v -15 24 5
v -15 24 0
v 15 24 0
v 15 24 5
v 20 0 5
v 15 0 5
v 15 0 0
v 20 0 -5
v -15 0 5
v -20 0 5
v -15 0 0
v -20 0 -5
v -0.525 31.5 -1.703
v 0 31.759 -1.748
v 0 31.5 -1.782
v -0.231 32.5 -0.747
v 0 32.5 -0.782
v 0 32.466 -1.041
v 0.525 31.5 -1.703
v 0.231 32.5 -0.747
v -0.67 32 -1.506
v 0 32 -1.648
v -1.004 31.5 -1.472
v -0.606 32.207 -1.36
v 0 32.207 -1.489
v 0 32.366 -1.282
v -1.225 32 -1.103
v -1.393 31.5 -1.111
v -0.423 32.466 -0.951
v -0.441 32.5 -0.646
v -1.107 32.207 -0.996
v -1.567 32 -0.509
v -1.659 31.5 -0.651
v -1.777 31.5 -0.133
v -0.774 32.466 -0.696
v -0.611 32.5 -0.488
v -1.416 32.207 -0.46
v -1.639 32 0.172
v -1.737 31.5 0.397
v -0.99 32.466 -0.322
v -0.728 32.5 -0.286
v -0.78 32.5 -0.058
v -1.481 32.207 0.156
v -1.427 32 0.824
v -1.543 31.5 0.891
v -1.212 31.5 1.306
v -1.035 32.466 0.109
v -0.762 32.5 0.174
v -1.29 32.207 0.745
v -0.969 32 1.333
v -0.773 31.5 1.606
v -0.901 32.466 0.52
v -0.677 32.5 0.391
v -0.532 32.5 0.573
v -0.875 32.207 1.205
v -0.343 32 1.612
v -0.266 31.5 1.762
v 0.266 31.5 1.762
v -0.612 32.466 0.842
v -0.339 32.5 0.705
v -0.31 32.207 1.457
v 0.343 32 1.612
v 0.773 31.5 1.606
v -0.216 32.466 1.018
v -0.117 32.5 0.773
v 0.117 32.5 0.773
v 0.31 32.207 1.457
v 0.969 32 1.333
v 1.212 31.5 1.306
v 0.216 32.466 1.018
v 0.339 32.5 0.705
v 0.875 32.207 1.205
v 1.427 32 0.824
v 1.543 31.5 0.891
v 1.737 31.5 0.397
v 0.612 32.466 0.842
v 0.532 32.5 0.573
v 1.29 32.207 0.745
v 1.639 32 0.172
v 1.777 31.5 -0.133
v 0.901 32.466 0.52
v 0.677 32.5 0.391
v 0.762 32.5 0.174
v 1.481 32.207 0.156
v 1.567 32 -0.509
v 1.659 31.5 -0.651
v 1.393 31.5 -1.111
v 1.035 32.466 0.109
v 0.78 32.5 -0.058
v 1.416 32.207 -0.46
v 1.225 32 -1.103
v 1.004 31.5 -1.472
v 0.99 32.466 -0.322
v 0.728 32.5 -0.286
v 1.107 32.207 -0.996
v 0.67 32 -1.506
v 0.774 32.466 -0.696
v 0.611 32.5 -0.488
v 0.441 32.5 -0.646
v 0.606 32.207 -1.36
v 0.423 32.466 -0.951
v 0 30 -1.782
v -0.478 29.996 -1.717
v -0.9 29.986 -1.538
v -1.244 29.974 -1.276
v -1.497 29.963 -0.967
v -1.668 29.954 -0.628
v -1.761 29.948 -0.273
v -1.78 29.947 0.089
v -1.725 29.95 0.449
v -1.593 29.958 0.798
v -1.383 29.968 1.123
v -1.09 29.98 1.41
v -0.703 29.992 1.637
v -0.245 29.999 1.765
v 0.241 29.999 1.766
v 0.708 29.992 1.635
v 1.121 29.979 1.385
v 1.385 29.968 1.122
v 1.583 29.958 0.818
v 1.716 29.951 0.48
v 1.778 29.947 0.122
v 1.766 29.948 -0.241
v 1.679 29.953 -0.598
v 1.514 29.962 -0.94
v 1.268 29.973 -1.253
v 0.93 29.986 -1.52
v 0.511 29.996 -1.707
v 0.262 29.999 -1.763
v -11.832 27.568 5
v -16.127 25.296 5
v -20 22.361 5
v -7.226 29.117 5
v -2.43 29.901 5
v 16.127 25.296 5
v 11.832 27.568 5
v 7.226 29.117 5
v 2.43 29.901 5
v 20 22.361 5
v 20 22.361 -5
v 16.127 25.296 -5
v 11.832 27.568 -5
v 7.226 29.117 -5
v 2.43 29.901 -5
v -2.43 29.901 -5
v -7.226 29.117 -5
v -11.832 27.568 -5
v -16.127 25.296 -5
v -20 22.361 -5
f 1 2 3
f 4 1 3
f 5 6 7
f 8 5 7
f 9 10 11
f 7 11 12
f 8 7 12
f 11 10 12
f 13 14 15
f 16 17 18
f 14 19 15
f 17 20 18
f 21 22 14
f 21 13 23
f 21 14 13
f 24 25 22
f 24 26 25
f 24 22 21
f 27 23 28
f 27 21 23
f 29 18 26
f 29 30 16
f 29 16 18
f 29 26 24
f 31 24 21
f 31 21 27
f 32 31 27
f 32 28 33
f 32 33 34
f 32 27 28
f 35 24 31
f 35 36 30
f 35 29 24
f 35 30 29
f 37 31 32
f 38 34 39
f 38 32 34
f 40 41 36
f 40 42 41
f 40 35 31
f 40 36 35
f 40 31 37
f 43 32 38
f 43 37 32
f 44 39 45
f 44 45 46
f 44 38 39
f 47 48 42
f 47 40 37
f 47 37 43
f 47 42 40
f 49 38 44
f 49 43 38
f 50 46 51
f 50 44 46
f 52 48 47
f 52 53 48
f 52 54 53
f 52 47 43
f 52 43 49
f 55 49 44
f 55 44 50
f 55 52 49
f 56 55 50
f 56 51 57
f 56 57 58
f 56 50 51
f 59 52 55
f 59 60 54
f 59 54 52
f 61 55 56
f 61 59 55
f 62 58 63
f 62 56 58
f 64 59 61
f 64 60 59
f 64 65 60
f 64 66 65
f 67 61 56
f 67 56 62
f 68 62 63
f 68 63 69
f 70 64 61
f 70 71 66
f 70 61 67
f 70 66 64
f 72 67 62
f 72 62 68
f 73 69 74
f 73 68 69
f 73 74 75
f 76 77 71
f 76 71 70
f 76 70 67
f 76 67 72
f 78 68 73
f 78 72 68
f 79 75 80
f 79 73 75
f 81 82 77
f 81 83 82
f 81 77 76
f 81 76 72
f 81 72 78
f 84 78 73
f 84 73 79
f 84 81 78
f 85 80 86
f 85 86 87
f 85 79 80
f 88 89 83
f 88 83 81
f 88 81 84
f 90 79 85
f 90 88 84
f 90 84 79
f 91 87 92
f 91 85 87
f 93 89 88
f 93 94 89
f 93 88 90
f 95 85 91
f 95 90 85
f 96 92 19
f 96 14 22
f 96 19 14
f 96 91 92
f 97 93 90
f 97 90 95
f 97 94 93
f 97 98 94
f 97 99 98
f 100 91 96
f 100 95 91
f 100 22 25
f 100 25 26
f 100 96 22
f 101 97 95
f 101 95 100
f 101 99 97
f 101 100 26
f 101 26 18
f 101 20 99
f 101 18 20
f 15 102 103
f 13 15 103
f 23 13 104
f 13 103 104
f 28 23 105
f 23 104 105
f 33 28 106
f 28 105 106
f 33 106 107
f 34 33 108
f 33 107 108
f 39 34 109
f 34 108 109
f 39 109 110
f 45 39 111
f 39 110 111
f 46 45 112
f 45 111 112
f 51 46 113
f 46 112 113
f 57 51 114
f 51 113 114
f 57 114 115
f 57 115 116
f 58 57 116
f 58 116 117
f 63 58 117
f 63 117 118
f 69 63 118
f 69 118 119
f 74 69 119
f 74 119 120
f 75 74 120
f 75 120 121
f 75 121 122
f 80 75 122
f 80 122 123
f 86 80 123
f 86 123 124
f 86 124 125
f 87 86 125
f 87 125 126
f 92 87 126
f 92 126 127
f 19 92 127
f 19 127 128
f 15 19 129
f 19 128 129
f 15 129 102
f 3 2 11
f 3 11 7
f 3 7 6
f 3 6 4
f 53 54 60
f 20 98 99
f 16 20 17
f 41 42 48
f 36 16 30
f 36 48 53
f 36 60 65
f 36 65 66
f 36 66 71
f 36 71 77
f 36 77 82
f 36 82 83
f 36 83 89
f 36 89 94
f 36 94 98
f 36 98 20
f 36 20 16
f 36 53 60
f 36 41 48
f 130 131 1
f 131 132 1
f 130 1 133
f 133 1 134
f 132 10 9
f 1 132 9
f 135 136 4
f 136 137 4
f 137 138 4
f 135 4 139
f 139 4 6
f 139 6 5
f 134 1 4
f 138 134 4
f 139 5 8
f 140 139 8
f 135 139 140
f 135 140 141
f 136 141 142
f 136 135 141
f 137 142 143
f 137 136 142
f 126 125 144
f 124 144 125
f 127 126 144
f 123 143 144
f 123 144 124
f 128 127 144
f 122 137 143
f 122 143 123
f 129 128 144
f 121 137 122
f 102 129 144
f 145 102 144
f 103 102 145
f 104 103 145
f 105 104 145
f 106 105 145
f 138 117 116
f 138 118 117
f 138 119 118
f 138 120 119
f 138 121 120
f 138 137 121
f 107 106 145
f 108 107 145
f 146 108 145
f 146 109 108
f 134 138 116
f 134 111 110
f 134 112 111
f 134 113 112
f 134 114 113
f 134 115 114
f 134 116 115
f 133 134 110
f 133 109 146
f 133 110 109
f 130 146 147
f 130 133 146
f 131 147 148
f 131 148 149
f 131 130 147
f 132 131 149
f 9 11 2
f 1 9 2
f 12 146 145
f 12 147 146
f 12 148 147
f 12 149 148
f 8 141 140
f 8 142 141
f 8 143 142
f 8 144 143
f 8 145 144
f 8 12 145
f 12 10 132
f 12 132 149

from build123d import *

# Parameters (mm, degrees)
SKETCH2_W           = 40
SKETCH2_H           = 10
BOSS_EXTRUDE1_DEPTH = 40
CUT_EXTRUDE1_START  = -10
CUT_EXTRUDE1_DEPTH  = 10
SKETCH7_R           = 1.782070526
BOSS_EXTRUDE2_DEPTH = 32.5
FILLET2_R           = 1
SKETCH8_W           = 30
SKETCH8_H           = 24
CUT_EXTRUDE2_DEPTH  = 5


# Read off the part's stored shape, not the designer's step: Cut-Extrude1
with BuildPart() as part:
    # Sketch2 → Boss-Extrude1 (new body)
    with BuildSketch(Plane(origin=(0, 0, 0), x_dir=(1, 0, 0), z_dir=(0, 1, 0))):
        Rectangle(SKETCH2_W, SKETCH2_H)
    extrude(amount=BOSS_EXTRUDE1_DEPTH)

    # Cut-Extrude1 outline → Cut-Extrude1 (cut)
    with BuildSketch(Plane(origin=(0, 0, -5), x_dir=(-1, 0, 0), z_dir=(0, 0, -1)).offset(CUT_EXTRUDE1_START)):
        with BuildLine():
            ThreePointArc((-20, 22.360679775), (0, 30), (20, 22.360679775))
            Line((20, 22.360679775), (20, 40))
            Line((20, 40), (-20, 40))
            Line((-20, 40), (-20, 22.360679775))
        make_face()
    extrude(amount=CUT_EXTRUDE1_DEPTH, mode=Mode.SUBTRACT)

    # Sketch7 → Boss-Extrude2 (add)
    with BuildSketch(Plane(origin=(0, 0, 0), x_dir=(1, 0, 0), z_dir=(0, 1, 0))):
        with Locations(Location((0, 0, 0), (0, 0, 90))):
            Circle(SKETCH7_R)
    extrude(amount=BOSS_EXTRUDE2_DEPTH)

    # Fillet2
    fillet2_edges = [part.edges().sort_by_distance(p)[0] for p in [
        (0, 32.5, 1.782070526),
    ]]
    fillet(fillet2_edges, radius=FILLET2_R)

    # Sketch8 → Cut-Extrude2 (cut)
    with BuildSketch(Plane.XY):
        with Locations((0, 12)):
            Rectangle(SKETCH8_W, SKETCH8_H)
    extrude(amount=CUT_EXTRUDE2_DEPTH, mode=Mode.SUBTRACT)


solid = part.part
